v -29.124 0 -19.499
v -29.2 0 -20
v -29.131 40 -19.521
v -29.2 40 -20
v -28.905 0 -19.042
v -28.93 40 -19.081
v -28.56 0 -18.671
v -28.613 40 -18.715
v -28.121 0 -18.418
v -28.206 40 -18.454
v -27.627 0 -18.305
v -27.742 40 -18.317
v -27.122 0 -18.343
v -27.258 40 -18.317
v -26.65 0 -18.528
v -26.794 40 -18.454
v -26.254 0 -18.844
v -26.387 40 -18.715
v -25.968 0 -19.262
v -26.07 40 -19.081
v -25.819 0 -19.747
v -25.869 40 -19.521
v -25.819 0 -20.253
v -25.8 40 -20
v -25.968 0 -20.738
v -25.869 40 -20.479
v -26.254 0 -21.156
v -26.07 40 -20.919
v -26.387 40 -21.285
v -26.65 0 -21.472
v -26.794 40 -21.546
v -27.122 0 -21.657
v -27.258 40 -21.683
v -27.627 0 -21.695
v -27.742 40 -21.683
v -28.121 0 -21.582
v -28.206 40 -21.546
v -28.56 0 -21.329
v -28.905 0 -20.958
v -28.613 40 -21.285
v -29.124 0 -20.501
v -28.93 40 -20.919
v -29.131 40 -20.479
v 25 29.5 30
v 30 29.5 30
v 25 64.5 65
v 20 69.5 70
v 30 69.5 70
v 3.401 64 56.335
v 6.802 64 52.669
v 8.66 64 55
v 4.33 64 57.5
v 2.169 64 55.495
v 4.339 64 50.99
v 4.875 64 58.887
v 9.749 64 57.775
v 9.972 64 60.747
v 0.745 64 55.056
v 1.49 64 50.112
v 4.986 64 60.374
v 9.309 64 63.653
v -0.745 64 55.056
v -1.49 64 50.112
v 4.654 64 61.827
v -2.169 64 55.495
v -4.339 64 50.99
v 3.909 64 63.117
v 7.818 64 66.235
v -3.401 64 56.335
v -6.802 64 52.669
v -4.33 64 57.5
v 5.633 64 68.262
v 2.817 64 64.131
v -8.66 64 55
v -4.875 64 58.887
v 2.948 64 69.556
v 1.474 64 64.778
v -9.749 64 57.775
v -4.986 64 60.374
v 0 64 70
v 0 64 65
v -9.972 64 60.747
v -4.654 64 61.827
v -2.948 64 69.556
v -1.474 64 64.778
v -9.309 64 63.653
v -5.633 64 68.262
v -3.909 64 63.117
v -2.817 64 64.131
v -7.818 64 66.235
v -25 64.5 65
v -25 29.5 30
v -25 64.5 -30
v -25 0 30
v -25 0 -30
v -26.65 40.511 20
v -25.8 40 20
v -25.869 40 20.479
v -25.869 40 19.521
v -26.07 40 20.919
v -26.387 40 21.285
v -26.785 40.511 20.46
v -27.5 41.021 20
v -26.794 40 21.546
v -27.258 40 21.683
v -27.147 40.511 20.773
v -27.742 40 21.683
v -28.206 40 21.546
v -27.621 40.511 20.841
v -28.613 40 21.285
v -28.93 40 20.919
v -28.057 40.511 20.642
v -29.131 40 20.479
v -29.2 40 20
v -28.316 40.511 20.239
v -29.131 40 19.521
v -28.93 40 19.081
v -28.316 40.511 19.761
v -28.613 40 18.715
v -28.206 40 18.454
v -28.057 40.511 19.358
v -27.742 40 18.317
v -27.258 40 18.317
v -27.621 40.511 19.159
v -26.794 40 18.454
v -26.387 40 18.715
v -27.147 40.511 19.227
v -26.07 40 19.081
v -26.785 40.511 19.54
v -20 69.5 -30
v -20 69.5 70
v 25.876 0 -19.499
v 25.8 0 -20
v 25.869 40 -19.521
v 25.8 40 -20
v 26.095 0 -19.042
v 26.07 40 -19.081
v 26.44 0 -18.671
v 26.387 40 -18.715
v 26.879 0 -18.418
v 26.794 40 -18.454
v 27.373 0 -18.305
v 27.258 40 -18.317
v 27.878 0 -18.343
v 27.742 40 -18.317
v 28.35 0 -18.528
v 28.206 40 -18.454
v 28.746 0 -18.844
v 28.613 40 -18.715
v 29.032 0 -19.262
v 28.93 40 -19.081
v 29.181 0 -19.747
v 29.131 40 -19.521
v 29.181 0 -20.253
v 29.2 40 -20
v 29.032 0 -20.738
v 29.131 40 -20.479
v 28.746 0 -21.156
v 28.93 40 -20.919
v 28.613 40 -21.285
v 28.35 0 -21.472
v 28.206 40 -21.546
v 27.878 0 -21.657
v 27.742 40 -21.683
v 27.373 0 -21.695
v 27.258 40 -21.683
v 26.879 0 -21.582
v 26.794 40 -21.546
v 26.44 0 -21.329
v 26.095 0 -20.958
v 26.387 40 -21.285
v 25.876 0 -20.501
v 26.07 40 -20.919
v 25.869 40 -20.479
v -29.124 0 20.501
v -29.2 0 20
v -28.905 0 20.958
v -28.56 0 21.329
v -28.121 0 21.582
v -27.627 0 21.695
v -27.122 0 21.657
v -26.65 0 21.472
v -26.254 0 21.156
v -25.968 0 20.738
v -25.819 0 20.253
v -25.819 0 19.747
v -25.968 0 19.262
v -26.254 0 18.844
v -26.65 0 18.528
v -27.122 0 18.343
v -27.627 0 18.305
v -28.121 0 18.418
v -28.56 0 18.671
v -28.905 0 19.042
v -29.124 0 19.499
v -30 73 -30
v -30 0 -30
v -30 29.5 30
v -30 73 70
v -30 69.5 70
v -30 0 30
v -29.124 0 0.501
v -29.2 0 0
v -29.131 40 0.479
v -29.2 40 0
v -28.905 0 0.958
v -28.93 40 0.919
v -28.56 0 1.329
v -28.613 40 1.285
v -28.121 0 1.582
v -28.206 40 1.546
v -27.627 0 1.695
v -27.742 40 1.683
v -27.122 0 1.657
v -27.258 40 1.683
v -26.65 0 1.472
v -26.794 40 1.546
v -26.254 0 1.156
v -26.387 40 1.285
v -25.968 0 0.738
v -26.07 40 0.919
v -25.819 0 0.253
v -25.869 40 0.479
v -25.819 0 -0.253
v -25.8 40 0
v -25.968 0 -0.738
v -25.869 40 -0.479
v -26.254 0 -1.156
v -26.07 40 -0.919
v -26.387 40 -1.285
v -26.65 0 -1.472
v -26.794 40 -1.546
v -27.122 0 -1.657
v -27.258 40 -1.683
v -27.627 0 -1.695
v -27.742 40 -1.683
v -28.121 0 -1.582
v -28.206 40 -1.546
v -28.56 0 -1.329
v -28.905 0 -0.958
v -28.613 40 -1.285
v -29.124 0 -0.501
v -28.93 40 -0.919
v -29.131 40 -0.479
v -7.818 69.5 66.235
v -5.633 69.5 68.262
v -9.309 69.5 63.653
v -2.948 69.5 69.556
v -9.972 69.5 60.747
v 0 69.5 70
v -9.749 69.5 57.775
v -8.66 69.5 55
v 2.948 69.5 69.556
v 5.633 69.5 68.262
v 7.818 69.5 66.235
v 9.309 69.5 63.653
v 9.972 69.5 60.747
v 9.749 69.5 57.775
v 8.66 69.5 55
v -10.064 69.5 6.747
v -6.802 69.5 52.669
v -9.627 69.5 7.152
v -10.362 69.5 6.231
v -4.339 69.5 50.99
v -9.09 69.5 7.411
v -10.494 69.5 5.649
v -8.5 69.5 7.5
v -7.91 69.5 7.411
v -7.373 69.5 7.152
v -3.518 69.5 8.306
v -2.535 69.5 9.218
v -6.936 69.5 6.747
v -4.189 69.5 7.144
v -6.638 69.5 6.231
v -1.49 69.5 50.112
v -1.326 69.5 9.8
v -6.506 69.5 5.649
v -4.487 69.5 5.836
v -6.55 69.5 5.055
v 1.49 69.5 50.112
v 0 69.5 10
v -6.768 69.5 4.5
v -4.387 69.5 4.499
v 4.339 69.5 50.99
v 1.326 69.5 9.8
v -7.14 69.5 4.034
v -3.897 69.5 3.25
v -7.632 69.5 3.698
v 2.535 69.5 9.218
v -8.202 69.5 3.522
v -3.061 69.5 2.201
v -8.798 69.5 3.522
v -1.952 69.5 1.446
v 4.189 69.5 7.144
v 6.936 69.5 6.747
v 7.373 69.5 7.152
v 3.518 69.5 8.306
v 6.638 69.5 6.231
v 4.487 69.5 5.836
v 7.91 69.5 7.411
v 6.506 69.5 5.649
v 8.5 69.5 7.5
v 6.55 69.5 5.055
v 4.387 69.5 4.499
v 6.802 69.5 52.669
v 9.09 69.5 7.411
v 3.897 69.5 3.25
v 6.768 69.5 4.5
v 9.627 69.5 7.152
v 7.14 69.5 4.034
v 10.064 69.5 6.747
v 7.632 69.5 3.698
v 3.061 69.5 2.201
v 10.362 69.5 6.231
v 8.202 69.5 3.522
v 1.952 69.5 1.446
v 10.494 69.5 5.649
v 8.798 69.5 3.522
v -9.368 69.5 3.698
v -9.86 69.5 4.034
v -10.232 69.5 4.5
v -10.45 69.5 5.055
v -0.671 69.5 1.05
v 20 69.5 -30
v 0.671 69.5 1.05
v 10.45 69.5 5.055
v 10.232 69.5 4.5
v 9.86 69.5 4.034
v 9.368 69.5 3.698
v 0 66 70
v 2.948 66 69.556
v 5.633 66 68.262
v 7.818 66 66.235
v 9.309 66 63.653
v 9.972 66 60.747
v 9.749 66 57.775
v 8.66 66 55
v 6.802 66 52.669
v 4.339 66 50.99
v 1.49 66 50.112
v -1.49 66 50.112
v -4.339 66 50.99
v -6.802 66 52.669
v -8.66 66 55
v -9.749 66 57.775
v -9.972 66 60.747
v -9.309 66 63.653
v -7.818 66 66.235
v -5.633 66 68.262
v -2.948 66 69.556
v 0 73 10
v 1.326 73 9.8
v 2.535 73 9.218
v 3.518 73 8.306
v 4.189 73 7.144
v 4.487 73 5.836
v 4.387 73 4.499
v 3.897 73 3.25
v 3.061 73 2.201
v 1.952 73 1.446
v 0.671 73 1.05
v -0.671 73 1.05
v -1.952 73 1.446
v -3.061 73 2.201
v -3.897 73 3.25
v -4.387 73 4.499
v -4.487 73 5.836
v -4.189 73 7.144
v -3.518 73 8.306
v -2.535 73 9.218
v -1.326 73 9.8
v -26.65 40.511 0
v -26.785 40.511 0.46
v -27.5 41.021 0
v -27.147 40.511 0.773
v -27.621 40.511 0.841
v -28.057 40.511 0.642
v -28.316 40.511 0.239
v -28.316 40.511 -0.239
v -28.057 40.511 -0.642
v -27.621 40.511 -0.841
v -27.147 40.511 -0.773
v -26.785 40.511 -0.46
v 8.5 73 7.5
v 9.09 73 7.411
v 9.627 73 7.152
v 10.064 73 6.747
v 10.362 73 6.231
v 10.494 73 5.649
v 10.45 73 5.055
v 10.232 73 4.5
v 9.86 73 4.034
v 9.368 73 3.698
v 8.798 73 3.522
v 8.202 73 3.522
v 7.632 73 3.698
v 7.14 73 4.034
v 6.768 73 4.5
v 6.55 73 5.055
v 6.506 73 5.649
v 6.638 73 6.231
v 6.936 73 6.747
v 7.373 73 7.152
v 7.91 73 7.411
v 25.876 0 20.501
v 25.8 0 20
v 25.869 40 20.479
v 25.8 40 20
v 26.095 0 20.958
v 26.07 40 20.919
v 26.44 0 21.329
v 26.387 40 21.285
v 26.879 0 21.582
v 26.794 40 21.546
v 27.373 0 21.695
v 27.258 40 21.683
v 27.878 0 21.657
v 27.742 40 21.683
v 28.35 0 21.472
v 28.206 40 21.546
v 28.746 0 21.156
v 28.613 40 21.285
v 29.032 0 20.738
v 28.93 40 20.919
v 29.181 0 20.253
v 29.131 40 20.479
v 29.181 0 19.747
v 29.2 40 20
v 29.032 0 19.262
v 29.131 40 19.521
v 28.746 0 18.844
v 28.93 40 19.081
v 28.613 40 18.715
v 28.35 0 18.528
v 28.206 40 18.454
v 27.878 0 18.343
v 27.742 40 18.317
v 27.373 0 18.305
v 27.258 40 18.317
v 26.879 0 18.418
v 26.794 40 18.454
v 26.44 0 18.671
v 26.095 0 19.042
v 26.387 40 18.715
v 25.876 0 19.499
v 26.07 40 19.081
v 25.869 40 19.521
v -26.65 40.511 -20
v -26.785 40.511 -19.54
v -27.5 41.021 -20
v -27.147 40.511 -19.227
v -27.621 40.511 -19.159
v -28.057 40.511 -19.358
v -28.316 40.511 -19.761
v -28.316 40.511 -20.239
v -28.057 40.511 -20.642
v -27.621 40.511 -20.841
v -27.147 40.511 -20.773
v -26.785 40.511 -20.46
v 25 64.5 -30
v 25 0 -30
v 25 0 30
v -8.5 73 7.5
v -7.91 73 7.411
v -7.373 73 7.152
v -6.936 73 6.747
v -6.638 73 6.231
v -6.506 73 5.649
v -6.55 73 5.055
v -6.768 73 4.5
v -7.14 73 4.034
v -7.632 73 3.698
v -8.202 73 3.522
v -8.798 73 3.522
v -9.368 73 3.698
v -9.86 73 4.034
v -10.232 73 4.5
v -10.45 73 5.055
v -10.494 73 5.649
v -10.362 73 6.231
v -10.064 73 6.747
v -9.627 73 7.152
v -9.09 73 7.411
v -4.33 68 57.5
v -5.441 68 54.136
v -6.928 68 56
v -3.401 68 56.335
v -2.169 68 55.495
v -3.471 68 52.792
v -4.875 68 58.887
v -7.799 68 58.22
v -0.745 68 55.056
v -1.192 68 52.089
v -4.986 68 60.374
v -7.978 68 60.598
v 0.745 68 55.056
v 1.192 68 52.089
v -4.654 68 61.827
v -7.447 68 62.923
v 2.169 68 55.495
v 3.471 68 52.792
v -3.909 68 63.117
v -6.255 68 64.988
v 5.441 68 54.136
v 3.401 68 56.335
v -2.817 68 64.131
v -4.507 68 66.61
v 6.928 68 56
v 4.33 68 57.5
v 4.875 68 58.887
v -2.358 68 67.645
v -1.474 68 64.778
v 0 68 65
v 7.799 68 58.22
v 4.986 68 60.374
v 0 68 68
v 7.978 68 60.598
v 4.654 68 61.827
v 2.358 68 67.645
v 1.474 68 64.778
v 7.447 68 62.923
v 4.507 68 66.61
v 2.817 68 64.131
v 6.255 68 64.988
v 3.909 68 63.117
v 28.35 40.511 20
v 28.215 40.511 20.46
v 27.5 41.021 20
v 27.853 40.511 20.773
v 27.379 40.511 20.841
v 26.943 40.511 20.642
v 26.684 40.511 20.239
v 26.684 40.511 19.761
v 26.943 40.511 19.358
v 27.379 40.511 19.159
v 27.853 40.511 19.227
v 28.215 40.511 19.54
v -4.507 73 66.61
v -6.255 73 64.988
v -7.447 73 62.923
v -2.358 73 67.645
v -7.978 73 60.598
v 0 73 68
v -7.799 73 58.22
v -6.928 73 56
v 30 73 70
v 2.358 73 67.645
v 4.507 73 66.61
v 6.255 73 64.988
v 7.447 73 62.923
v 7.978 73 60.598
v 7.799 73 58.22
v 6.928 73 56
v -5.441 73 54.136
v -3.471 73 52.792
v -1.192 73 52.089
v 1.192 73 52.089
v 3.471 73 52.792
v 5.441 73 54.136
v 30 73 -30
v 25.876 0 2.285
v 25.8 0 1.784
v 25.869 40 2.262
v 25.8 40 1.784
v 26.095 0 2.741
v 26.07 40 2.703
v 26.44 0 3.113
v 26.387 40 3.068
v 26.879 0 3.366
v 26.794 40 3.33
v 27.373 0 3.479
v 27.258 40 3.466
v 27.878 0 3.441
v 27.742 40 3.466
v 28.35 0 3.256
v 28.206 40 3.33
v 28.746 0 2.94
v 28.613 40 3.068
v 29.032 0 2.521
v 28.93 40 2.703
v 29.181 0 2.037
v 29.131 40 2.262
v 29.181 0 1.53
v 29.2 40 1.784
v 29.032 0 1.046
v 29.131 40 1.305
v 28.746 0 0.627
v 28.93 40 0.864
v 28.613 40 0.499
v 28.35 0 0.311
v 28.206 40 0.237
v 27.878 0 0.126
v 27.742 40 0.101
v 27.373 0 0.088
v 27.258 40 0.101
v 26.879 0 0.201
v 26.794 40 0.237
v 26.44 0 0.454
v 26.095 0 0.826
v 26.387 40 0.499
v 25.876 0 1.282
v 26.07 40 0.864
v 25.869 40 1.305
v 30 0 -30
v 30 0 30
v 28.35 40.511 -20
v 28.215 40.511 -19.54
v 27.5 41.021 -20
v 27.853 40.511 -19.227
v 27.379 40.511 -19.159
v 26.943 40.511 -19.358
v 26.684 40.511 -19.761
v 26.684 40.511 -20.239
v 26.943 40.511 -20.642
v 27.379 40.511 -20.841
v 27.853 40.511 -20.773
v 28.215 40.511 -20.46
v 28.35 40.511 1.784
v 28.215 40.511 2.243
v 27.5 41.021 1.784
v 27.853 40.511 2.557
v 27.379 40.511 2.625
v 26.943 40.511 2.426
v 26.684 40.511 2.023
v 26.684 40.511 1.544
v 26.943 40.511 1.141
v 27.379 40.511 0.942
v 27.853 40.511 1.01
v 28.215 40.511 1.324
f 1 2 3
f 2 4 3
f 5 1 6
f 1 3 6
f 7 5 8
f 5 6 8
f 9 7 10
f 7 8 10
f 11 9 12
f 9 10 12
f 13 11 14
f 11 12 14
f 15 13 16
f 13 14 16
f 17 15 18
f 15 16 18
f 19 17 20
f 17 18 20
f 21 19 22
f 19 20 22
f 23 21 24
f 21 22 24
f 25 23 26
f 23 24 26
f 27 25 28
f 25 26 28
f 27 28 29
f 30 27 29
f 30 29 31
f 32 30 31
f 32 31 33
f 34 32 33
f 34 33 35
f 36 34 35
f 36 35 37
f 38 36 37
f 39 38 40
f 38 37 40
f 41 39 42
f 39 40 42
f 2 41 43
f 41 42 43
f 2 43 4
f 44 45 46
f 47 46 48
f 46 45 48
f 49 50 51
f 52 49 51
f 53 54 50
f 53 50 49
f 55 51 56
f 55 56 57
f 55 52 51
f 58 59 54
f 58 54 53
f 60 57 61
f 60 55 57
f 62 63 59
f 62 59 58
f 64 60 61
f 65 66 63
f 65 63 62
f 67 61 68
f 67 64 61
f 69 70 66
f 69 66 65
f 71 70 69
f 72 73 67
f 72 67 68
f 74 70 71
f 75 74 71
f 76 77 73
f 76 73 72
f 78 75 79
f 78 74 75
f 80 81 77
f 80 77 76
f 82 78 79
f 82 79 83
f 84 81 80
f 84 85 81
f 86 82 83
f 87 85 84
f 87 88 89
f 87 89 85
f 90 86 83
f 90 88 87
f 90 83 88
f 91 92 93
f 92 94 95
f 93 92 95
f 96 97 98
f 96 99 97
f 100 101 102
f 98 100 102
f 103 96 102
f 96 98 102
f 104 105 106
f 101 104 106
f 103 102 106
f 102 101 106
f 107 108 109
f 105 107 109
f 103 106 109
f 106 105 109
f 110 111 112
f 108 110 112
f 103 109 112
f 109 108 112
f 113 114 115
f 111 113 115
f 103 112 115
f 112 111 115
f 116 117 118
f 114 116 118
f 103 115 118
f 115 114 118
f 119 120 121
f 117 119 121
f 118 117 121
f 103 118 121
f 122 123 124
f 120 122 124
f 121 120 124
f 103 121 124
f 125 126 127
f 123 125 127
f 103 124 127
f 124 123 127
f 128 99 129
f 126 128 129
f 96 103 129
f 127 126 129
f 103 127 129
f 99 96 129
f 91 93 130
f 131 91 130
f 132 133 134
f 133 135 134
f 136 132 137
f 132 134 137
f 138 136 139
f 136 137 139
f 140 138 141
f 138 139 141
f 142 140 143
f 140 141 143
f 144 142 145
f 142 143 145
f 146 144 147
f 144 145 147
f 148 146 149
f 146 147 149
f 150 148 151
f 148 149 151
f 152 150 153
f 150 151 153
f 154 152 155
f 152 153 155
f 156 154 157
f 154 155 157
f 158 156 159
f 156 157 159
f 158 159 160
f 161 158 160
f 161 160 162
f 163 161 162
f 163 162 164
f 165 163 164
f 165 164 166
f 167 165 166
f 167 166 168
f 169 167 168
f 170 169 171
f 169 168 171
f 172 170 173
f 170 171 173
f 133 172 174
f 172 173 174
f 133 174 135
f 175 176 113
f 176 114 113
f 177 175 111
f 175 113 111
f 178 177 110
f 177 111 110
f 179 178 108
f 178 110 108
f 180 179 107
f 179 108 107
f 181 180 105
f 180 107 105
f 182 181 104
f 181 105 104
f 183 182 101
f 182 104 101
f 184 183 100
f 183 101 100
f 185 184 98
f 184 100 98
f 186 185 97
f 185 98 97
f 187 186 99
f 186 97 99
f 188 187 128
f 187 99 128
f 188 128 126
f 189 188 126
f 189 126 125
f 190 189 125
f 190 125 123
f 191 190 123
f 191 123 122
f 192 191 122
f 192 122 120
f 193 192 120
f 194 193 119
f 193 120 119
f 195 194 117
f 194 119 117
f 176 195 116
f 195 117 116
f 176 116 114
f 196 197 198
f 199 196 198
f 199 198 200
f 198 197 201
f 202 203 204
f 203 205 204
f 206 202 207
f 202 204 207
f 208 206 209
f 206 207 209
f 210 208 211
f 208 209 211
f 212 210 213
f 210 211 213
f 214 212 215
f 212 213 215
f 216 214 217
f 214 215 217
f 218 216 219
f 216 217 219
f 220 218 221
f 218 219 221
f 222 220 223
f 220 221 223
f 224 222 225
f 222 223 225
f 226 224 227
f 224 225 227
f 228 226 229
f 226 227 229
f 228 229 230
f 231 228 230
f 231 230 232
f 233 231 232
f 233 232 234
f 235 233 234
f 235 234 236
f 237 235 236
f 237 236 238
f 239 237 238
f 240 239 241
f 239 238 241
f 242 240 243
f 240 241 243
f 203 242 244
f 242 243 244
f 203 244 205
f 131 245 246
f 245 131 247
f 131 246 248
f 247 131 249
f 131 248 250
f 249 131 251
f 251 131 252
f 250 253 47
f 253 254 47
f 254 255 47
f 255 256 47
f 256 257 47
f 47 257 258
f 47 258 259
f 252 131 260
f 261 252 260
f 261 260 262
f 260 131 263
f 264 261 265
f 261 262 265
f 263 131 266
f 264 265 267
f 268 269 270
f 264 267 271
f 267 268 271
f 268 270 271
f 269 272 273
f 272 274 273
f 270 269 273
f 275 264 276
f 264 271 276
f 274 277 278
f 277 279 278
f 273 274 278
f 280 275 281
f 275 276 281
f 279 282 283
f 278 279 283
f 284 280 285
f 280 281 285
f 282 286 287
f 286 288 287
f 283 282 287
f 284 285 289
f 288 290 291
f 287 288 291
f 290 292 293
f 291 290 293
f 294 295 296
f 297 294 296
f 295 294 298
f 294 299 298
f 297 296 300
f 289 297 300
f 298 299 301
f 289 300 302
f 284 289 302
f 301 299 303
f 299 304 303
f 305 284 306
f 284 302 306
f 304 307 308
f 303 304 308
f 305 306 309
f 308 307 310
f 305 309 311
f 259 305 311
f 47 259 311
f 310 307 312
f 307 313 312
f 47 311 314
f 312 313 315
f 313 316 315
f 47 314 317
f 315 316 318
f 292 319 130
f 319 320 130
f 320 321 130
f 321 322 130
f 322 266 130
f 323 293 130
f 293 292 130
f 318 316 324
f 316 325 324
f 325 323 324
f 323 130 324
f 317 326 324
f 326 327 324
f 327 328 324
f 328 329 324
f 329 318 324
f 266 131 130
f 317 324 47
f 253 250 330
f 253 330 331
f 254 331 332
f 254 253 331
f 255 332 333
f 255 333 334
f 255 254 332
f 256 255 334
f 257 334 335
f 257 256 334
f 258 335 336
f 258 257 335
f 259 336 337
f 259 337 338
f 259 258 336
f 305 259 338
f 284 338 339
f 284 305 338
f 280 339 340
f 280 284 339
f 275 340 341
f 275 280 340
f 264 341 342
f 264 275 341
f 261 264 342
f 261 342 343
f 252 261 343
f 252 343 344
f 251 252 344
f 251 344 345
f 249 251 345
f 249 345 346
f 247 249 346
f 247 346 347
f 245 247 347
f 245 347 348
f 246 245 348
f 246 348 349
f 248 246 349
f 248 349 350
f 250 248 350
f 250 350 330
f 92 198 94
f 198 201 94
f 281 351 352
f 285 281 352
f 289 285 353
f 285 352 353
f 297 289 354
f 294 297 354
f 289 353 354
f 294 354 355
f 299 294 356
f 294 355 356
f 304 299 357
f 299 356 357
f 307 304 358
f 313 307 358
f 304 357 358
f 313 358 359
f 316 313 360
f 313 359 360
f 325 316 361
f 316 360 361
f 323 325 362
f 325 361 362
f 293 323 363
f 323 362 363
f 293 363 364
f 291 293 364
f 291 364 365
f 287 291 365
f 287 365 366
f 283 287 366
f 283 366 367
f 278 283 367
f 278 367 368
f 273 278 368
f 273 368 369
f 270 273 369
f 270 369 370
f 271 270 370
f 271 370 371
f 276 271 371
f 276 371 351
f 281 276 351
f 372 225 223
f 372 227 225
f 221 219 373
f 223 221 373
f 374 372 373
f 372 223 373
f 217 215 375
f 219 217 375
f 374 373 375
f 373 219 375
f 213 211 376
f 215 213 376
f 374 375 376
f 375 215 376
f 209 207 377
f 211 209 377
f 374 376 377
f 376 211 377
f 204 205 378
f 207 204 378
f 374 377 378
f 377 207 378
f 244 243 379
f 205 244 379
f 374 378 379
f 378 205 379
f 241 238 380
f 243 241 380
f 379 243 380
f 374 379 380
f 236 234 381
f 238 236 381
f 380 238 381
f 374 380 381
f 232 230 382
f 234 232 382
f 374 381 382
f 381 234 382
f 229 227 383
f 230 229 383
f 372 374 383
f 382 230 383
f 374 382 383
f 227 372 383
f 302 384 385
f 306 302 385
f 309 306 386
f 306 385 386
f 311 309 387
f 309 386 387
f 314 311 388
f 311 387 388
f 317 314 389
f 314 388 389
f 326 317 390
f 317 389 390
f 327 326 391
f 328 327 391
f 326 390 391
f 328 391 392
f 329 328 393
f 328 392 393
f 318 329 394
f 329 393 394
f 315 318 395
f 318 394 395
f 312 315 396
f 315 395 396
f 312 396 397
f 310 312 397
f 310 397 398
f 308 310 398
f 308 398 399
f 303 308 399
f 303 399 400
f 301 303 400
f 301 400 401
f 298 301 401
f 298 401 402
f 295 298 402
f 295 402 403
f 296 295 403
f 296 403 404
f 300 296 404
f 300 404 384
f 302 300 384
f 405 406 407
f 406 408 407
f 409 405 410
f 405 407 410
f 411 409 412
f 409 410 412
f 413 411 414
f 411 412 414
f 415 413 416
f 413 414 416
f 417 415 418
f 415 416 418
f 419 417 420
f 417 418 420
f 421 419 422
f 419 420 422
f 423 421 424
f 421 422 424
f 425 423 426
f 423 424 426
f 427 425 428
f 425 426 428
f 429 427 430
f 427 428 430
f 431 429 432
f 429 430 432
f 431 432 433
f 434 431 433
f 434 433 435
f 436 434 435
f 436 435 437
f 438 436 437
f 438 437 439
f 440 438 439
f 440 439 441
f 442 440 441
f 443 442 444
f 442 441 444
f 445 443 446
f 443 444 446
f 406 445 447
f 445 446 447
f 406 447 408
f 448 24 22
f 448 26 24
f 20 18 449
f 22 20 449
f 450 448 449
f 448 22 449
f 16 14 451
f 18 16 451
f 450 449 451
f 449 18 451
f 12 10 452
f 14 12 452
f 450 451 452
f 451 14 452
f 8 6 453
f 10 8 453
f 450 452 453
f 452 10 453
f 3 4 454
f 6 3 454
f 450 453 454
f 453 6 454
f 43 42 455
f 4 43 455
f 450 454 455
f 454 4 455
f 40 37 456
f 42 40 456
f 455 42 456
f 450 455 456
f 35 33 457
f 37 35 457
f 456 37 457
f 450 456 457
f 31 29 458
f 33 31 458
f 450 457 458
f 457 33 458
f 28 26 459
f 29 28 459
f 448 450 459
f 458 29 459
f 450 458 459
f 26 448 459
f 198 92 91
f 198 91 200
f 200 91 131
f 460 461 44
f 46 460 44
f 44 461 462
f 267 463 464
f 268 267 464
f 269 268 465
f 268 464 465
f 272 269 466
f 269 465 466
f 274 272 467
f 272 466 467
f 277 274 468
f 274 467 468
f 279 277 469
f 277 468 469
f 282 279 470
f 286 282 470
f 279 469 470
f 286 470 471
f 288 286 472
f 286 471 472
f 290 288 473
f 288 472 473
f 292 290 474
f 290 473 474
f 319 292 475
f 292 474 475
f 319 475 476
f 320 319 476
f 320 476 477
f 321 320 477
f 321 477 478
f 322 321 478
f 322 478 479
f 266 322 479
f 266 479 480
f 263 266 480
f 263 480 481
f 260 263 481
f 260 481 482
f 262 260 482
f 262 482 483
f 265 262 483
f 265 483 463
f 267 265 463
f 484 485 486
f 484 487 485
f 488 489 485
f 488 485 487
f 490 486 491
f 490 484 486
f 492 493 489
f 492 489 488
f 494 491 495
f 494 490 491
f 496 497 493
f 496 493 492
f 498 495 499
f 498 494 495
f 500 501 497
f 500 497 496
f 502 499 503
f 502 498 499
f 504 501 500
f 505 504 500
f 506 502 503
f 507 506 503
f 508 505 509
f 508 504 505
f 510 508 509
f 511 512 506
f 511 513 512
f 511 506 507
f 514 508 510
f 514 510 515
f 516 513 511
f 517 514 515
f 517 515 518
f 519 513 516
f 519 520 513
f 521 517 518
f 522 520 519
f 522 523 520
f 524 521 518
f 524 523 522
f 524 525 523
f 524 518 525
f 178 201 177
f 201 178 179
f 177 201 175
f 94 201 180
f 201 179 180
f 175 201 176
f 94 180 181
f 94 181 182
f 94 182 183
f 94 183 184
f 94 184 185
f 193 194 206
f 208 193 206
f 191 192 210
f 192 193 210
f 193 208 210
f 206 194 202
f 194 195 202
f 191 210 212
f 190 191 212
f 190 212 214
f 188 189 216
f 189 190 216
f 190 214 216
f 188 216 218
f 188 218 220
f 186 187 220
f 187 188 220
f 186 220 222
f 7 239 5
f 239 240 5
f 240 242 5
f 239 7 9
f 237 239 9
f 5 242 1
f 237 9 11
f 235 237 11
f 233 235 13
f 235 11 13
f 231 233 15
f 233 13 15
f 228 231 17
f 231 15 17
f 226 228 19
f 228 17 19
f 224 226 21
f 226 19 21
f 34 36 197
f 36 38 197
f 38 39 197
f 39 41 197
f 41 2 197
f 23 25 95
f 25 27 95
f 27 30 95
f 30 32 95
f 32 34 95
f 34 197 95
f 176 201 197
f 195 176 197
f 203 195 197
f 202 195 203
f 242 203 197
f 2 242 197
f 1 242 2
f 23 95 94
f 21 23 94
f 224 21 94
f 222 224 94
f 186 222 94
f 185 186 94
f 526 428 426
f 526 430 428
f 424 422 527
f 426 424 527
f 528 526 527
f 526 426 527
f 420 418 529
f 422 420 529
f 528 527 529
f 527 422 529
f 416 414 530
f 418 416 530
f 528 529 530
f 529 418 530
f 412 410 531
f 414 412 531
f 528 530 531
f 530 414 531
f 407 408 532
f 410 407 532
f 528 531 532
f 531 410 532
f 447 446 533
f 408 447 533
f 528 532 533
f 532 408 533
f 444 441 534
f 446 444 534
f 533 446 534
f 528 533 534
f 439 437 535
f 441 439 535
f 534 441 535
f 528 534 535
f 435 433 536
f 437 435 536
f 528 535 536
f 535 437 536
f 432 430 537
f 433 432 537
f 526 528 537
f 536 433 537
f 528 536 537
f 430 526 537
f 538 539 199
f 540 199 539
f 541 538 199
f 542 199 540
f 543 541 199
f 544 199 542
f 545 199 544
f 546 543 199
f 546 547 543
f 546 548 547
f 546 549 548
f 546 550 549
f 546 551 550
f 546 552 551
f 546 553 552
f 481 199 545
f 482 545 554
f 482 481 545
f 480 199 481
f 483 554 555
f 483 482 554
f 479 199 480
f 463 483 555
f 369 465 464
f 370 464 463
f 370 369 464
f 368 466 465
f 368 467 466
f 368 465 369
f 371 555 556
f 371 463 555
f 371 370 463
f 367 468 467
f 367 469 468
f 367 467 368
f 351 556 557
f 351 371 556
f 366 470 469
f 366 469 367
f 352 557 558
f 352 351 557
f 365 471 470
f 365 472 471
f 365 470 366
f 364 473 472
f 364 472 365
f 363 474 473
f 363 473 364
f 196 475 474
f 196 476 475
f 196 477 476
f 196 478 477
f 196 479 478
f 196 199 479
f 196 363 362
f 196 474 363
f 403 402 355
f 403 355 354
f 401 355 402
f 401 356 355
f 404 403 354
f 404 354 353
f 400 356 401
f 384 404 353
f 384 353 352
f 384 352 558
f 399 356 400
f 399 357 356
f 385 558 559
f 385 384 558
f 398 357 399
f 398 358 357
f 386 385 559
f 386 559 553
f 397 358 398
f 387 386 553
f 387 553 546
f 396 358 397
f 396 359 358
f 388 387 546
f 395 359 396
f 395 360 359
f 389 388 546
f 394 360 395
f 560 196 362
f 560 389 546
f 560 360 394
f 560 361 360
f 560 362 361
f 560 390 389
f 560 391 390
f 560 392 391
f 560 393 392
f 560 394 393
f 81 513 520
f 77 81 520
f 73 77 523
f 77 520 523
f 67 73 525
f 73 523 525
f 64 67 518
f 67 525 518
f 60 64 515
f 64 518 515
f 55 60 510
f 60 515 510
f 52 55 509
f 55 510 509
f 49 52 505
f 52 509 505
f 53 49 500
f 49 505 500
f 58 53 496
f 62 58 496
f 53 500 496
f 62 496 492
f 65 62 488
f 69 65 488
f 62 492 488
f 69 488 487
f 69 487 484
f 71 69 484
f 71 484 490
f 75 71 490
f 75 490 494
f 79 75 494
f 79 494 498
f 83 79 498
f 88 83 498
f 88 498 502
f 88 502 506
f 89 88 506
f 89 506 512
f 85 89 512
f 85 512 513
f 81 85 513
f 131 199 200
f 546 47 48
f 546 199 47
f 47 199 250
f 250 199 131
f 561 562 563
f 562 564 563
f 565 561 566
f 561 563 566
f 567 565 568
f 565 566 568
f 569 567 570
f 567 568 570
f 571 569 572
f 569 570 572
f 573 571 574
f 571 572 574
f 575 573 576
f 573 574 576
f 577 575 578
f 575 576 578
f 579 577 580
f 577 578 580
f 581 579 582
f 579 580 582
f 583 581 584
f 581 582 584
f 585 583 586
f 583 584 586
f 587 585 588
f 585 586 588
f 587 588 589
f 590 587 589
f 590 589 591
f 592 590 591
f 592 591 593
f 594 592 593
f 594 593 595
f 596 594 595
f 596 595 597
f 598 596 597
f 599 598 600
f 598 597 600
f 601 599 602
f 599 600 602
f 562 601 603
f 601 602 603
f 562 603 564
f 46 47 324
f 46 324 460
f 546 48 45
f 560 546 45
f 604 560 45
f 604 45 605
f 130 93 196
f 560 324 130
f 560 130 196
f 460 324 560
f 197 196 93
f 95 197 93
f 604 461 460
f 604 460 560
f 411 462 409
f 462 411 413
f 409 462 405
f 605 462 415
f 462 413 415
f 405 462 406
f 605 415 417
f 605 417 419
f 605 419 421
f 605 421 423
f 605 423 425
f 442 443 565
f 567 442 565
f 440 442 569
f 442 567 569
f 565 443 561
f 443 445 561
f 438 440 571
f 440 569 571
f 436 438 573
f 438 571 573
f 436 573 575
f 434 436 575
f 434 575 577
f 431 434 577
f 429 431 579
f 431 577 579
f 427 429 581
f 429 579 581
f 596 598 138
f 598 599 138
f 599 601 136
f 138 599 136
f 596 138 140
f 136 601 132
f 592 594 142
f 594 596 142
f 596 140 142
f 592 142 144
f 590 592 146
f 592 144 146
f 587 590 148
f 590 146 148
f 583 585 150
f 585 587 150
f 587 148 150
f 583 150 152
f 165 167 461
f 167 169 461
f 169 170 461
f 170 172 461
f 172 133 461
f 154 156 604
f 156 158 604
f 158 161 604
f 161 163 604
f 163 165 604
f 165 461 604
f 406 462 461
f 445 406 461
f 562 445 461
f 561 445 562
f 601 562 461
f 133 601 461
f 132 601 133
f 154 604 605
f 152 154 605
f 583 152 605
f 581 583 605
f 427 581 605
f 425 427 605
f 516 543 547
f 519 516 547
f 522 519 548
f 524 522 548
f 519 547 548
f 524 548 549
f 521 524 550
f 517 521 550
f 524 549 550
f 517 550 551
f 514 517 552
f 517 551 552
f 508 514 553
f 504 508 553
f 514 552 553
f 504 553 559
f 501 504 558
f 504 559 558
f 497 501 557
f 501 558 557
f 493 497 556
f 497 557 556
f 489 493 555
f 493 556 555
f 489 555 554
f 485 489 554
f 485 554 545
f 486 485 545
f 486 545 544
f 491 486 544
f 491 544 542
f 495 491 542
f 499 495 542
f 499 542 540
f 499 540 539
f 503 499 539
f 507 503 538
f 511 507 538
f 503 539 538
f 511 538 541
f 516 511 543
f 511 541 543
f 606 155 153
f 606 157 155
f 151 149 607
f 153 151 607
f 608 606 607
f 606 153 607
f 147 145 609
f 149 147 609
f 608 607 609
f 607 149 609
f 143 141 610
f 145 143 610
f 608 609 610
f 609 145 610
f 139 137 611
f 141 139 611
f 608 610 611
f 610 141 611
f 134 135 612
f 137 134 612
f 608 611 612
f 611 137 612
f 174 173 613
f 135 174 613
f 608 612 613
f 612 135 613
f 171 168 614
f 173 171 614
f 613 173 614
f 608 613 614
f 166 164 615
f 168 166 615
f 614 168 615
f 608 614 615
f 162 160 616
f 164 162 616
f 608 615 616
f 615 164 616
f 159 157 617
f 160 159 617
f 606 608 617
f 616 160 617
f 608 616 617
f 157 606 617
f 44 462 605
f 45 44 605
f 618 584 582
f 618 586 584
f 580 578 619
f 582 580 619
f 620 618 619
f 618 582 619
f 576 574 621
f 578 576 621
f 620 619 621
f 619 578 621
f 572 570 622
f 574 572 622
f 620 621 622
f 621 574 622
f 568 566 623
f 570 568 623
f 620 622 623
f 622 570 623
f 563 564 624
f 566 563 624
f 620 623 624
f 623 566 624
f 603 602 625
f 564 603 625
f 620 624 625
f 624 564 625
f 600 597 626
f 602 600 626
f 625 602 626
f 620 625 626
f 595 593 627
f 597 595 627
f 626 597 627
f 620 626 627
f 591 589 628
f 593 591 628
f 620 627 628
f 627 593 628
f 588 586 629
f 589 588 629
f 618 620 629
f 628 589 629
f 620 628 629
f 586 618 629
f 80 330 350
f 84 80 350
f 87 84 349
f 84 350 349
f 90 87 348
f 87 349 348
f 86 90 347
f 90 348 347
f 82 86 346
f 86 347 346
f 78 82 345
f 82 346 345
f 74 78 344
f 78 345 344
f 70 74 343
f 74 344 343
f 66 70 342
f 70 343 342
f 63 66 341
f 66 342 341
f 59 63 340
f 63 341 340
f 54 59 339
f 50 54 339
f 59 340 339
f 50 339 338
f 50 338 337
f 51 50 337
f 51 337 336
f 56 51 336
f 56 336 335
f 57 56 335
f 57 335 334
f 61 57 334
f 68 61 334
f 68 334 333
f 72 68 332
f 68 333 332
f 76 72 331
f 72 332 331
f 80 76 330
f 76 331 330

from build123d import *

# Parameters (mm, degrees)
CROQUIS1_W                       = 60
CROQUIS1_H                       = 60
SALIENTE_EXTRUIR1_DEPTH          = 73
CORTAR_EXTRUIR1_REACH            = 101.141
CROQUIS2_W                       = 50
CROQUIS2_H                       = 69.5
CORTAR_EXTRUIR2_REACH            = 86.433
CROQUIS3_R                       = 2
CHAFL_N1_SIZE                    = 5
TALADRO_DE_MARGEN_PARA_M31_D     = 3.4
TALADRO_DE_MARGEN_PARA_M31_DEPTH = 40
TALADRO_DE_MARGEN_PARA_M31_TIP   = 1.021463052
TALADRO_DE_MARGEN_PARA_M32_D     = 3.4
TALADRO_DE_MARGEN_PARA_M32_DEPTH = 40
TALADRO_DE_MARGEN_PARA_M32_TIP   = 1.021463052
TALADRO_DE_MARGEN_PARA_M33_D     = 3.4
TALADRO_DE_MARGEN_PARA_M33_DEPTH = 40
TALADRO_DE_MARGEN_PARA_M33_TIP   = 1.021463052
CROQUIS11_W                      = 60
CROQUIS11_H                      = 3.5
SALIENTE_EXTRUIR2_DEPTH          = 40
CHAFL_N2_SIZE                    = 40
CORTAR_EXTRUIR3_REACH            = 107.494
CROQUIS12_R                      = 2.5
CROQUIS14_R                      = 10
SALIENTE_EXTRUIR3_DEPTH          = 7
CROQUIS15_R                      = 10
SALIENTE_EXTRUIR4_DEPTH          = 2
CROQUIS13_R                      = 8
CORTAR_EXTRUIR5_DEPTH            = 5
CROQUIS16_R                      = 5
CORTAR_EXTRUIR6_DEPTH            = 5
CROQUIS17_R                      = 4.5
CORTAR_EXTRUIR7_DEPTH            = 16


with BuildPart() as part:
    # Croquis1 → Saliente-Extruir1 (new body)
    with BuildSketch(Plane(origin=(0, 0, 0), x_dir=(1, 0, 0), z_dir=(0, 1, 0))):
        Rectangle(CROQUIS1_W, CROQUIS1_H)
    extrude(amount=SALIENTE_EXTRUIR1_DEPTH)

    # Croquis2 → Cortar-Extruir1 (cut, up to next)
    with BuildSketch(Plane.XY.offset(30), mode=Mode.PRIVATE) as cortar_extruir1_sk1:
        with Locations((0, 34.75)):
            Rectangle(CROQUIS2_W, CROQUIS2_H)
    cortar_extruir1_tool1 = extrude(cortar_extruir1_sk1.sketch, amount=-CORTAR_EXTRUIR1_REACH, mode=Mode.PRIVATE) & part.part
    add(cortar_extruir1_tool1.solids().sort_by_distance((0, 34.75, 30))[0], mode=Mode.SUBTRACT)

    # Croquis3 → Cortar-Extruir2 (cut, up to next)
    with BuildSketch(Plane(origin=(0, 73, 0), x_dir=(1, 0, 0), z_dir=(0, 1, 0)), mode=Mode.PRIVATE) as cortar_extruir2_sk1:
        with Locations(Location((-8.5, -5.5, 0), (0, 0, 270))):
            Circle(CROQUIS3_R)
    cortar_extruir2_tool1 = extrude(cortar_extruir2_sk1.sketch, amount=-CORTAR_EXTRUIR2_REACH, mode=Mode.PRIVATE) & part.part
    # Croquis3 → Cortar-Extruir2 (cut, up to next)
    with BuildSketch(Plane(origin=(0, 73, 0), x_dir=(1, 0, 0), z_dir=(0, 1, 0)), mode=Mode.PRIVATE) as cortar_extruir2_sk2:
        with Locations(Location((8.5, -5.5, 0), (0, 0, 270))):
            Circle(CROQUIS3_R)
    cortar_extruir2_tool2 = extrude(cortar_extruir2_sk2.sketch, amount=-CORTAR_EXTRUIR2_REACH, mode=Mode.PRIVATE) & part.part
    add(cortar_extruir2_tool1.solids().sort_by_distance((-8.5, 73, 5.5))[0], mode=Mode.SUBTRACT)
    add(cortar_extruir2_tool2.solids().sort_by_distance((8.5, 73, 5.5))[0], mode=Mode.SUBTRACT)

    # Chaflán1
    chafl_n1_edges = [part.edges().sort_by_distance(p)[0] for p in [
        (-25, 69.5, 0),
        (25, 69.5, 0),
    ]]
    chamfer(chafl_n1_edges, length=CHAFL_N1_SIZE)

    # Taladro de margen para M31
    with Locations(Plane.XZ):
        with Locations((27.5, -20), (27.5, 20)):
            Hole(TALADRO_DE_MARGEN_PARA_M31_D / 2, depth=TALADRO_DE_MARGEN_PARA_M31_DEPTH)
            with Locations((0, 0, -(TALADRO_DE_MARGEN_PARA_M31_DEPTH + TALADRO_DE_MARGEN_PARA_M31_TIP / 2))):  # 118° drill point
                Cone(0, TALADRO_DE_MARGEN_PARA_M31_D / 2, TALADRO_DE_MARGEN_PARA_M31_TIP, mode=Mode.SUBTRACT)

    # Taladro de margen para M32
    with Locations(Plane.XZ):
        with Locations((-27.5, 20), (-27.5, -20)):
            Hole(TALADRO_DE_MARGEN_PARA_M32_D / 2, depth=TALADRO_DE_MARGEN_PARA_M32_DEPTH)
            with Locations((0, 0, -(TALADRO_DE_MARGEN_PARA_M32_DEPTH + TALADRO_DE_MARGEN_PARA_M32_TIP / 2))):  # 118° drill point
                Cone(0, TALADRO_DE_MARGEN_PARA_M32_D / 2, TALADRO_DE_MARGEN_PARA_M32_TIP, mode=Mode.SUBTRACT)

    # Taladro de margen para M33
    with Locations(Plane.XZ):
        with Locations((-27.5, 0), (27.5, 1.783505525)):
            Hole(TALADRO_DE_MARGEN_PARA_M33_D / 2, depth=TALADRO_DE_MARGEN_PARA_M33_DEPTH)
            with Locations((0, 0, -(TALADRO_DE_MARGEN_PARA_M33_DEPTH + TALADRO_DE_MARGEN_PARA_M33_TIP / 2))):  # 118° drill point
                Cone(0, TALADRO_DE_MARGEN_PARA_M33_D / 2, TALADRO_DE_MARGEN_PARA_M33_TIP, mode=Mode.SUBTRACT)

    # Croquis11 → Saliente-Extruir2 (add)
    with BuildSketch(Plane.XY.offset(30)):
        with Locations((0, 71.25)):
            Rectangle(CROQUIS11_W, CROQUIS11_H)
    extrude(amount=SALIENTE_EXTRUIR2_DEPTH)

    # Chaflán2
    # the kernel refuses this chamfer: 40 mm, written as the material it adds along each edge
    with BuildSketch(Plane(origin=(30, 69.5, 30), x_dir=(0, -0.9996219169112968, -0.027495876610586403), z_dir=(-1, 0, 0))) as chafl_n2_piece_1_section:
        Polygon((CHAFL_N2_SIZE * 0.999621916911, CHAFL_N2_SIZE * 0.0274958766106), (-CHAFL_N2_SIZE * 0.0274958766106, CHAFL_N2_SIZE * 0.999621916911), (0, 0), align=None)
    chafl_n2_piece_1 = extrude(amount=112.867319519, mode=Mode.PRIVATE)
    chafl_n2_piece_1 = split(chafl_n2_piece_1, bisect_by=Plane(origin=(25, 65.769230769, 48.134615385), z_dir=(1, 0, 0)), keep=Keep.TOP, mode=Mode.PRIVATE)
    add(chafl_n2_piece_1)
    with BuildSketch(Plane(origin=(132.867319519, 69.5, 30), x_dir=(0, -0.9996219169112968, -0.027495876610586403), z_dir=(-1, 0, 0))) as chafl_n2_piece_2_section:
        Polygon((CHAFL_N2_SIZE * 0.999621916911, CHAFL_N2_SIZE * 0.0274958766106), (-CHAFL_N2_SIZE * 0.0274958766106, CHAFL_N2_SIZE * 0.999621916911), (0, 0), align=None)
    chafl_n2_piece_2 = extrude(amount=215.734639037, mode=Mode.PRIVATE)
    chafl_n2_piece_2 = split(chafl_n2_piece_2, bisect_by=Plane(origin=(22.472826087, 67.027173913, 49.184782609), z_dir=(0.7071067811865476, 0.7071067811865476, 0)), keep=Keep.TOP, mode=Mode.PRIVATE)
    chafl_n2_piece_2 = split(chafl_n2_piece_2, bisect_by=Plane(origin=(25, 67.869565217, 49.184782609), z_dir=(-1, 0, 0)), keep=Keep.TOP, mode=Mode.PRIVATE)
    add(chafl_n2_piece_2)
    with BuildSketch(Plane(origin=(132.867319519, 69.5, 30), x_dir=(0, -0.9996219169112968, -0.027495876610586403), z_dir=(-1, 0, 0))) as chafl_n2_piece_3_section:
        Polygon((CHAFL_N2_SIZE * 0.999621916911, CHAFL_N2_SIZE * 0.0274958766106), (-CHAFL_N2_SIZE * 0.0274958766106, CHAFL_N2_SIZE * 0.999621916911), (0, 0), align=None)
    chafl_n2_piece_3 = extrude(amount=215.734639037, mode=Mode.PRIVATE)
    chafl_n2_piece_3 = split(chafl_n2_piece_3, bisect_by=Plane(origin=(-30, 67.869565217, 49.184782609), z_dir=(1, 0, 0)), keep=Keep.TOP, mode=Mode.PRIVATE)
    chafl_n2_piece_3 = split(chafl_n2_piece_3, bisect_by=Plane(origin=(-22.472826087, 67.027173913, 49.184782609), z_dir=(-0.7071067811865476, 0.7071067811865476, 0)), keep=Keep.TOP, mode=Mode.PRIVATE)
    add(chafl_n2_piece_3)
    with BuildSketch(Plane(origin=(132.867319519, 69.5, 30), x_dir=(0, -0.9996219169112968, -0.027495876610586403), z_dir=(-1, 0, 0))) as chafl_n2_piece_4_section:
        Polygon((CHAFL_N2_SIZE * 0.999621916911, CHAFL_N2_SIZE * 0.0274958766106), (-CHAFL_N2_SIZE * 0.0274958766106, CHAFL_N2_SIZE * 0.999621916911), (0, 0), align=None)
    chafl_n2_piece_4 = extrude(amount=215.734639037, mode=Mode.PRIVATE)
    chafl_n2_piece_4 = split(chafl_n2_piece_4, bisect_by=Plane(origin=(-25, 51.251968504, 40.875984252), z_dir=(-1, 0, 0)), keep=Keep.TOP, mode=Mode.PRIVATE)
    chafl_n2_piece_4 = split(chafl_n2_piece_4, bisect_by=Plane(origin=(-30, 51.251968504, 40.875984252), z_dir=(1, 0, 0)), keep=Keep.TOP, mode=Mode.PRIVATE)
    add(chafl_n2_piece_4)
    with BuildSketch(Plane(origin=(82.867319519, 69.5, 30), x_dir=(0, -0.9996219169112968, -0.027495876610586403), z_dir=(-1, 0, 0))) as chafl_n2_piece_5_section:
        Polygon((CHAFL_N2_SIZE * 0.999621916911, CHAFL_N2_SIZE * 0.0274958766106), (-CHAFL_N2_SIZE * 0.0274958766106, CHAFL_N2_SIZE * 0.999621916911), (0, 0), align=None)
    chafl_n2_piece_5 = extrude(amount=215.734639037, mode=Mode.PRIVATE)
    chafl_n2_piece_5 = split(chafl_n2_piece_5, bisect_by=Plane(origin=(30, 65.769230769, 48.134615385), z_dir=(-1, 0, 0)), keep=Keep.TOP, mode=Mode.PRIVATE)
    chafl_n2_piece_5 = split(chafl_n2_piece_5, bisect_by=Plane(origin=(25, 65.769230769, 48.134615385), z_dir=(1, 0, 0)), keep=Keep.TOP, mode=Mode.PRIVATE)
    add(chafl_n2_piece_5)
    with BuildSketch(Plane(origin=(82.867319519, 69.5, 30), x_dir=(0, -0.9996219169112968, -0.027495876610586403), z_dir=(-1, 0, 0))) as chafl_n2_piece_6_section:
        Polygon((CHAFL_N2_SIZE * 0.999621916911, CHAFL_N2_SIZE * 0.0274958766106), (-CHAFL_N2_SIZE * 0.0274958766106, CHAFL_N2_SIZE * 0.999621916911), (0, 0), align=None)
    chafl_n2_piece_6 = extrude(amount=215.734639037, mode=Mode.PRIVATE)
    chafl_n2_piece_6 = split(chafl_n2_piece_6, bisect_by=Plane(origin=(22.472826087, 67.027173913, 49.184782609), z_dir=(0.7071067811865476, 0.7071067811865476, 0)), keep=Keep.TOP, mode=Mode.PRIVATE)
    chafl_n2_piece_6 = split(chafl_n2_piece_6, bisect_by=Plane(origin=(25, 67.869565217, 49.184782609), z_dir=(-1, 0, 0)), keep=Keep.TOP, mode=Mode.PRIVATE)
    add(chafl_n2_piece_6)
    with BuildSketch(Plane(origin=(82.867319519, 69.5, 30), x_dir=(0, -0.9996219169112968, -0.027495876610586403), z_dir=(-1, 0, 0))) as chafl_n2_piece_7_section:
        Polygon((CHAFL_N2_SIZE * 0.999621916911, CHAFL_N2_SIZE * 0.0274958766106), (-CHAFL_N2_SIZE * 0.0274958766106, CHAFL_N2_SIZE * 0.999621916911), (0, 0), align=None)
    chafl_n2_piece_7 = extrude(amount=112.867319519, mode=Mode.PRIVATE)
    chafl_n2_piece_7 = split(chafl_n2_piece_7, bisect_by=Plane(origin=(-22.472826087, 67.027173913, 49.184782609), z_dir=(-0.7071067811865476, 0.7071067811865476, 0)), keep=Keep.TOP, mode=Mode.PRIVATE)
    add(chafl_n2_piece_7)
    with BuildSketch(Plane(origin=(82.867319519, 69.5, 30), x_dir=(0, -0.9996219169112968, -0.027495876610586403), z_dir=(-1, 0, 0))) as chafl_n2_piece_8_section:
        Polygon((CHAFL_N2_SIZE * 0.999621916911, CHAFL_N2_SIZE * 0.0274958766106), (-CHAFL_N2_SIZE * 0.0274958766106, CHAFL_N2_SIZE * 0.999621916911), (0, 0), align=None)
    chafl_n2_piece_8 = extrude(amount=112.867319519, mode=Mode.PRIVATE)
    chafl_n2_piece_8 = split(chafl_n2_piece_8, bisect_by=Plane(origin=(-25, 51.251968504, 40.875984252), z_dir=(-1, 0, 0)), keep=Keep.TOP, mode=Mode.PRIVATE)
    add(chafl_n2_piece_8)

    # Croquis12 → Cortar-Extruir3 (cut, up to next)
    with BuildSketch(Plane(origin=(0, 73, 0), x_dir=(1, 0, 0), z_dir=(0, 1, 0)), mode=Mode.PRIVATE) as cortar_extruir3_sk1:
        with Locations(Location((0, -60, 0), (0, 0, 270))):
            Circle(CROQUIS12_R)
    cortar_extruir3_tool1 = extrude(cortar_extruir3_sk1.sketch, amount=-CORTAR_EXTRUIR3_REACH, mode=Mode.PRIVATE) & part.part
    add(cortar_extruir3_tool1.solids().sort_by_distance((0, 73, 60))[0], mode=Mode.SUBTRACT)

    # Croquis14 → Saliente-Extruir3 (add)
    with BuildSketch(Plane(origin=(0, 73, 0), x_dir=(1, 0, 0), z_dir=(0, 1, 0))):
        with Locations(Location((0, -60, 0), (0, 0, 270))):
            Circle(CROQUIS14_R)
    extrude(amount=-SALIENTE_EXTRUIR3_DEPTH)

    # Croquis15 → Saliente-Extruir4 (add)
    with BuildSketch(Plane.XZ.offset(-66)):
        with Locations(Location((0, 60, 0), (0, 0, 90))):
            Circle(CROQUIS15_R)
    extrude(amount=SALIENTE_EXTRUIR4_DEPTH)

    # Croquis13 → Cortar-Extruir5 (cut)
    with BuildSketch(Plane(origin=(0, 73, 0), x_dir=(1, 0, 0), z_dir=(0, 1, 0))):
        with Locations(Location((0, -60, 0), (0, 0, 270))):
            Circle(CROQUIS13_R)
    extrude(amount=-CORTAR_EXTRUIR5_DEPTH, mode=Mode.SUBTRACT)

    # Croquis16 → Cortar-Extruir6 (cut)
    with BuildSketch(Plane(origin=(0, 68, 0), x_dir=(1, 0, 0), z_dir=(0, 1, 0))):
        with Locations(Location((0, -60, 0), (0, 0, 270))):
            Circle(CROQUIS16_R)
    extrude(amount=-CORTAR_EXTRUIR6_DEPTH, mode=Mode.SUBTRACT)

    # Croquis17 → Cortar-Extruir7 (cut)
    with BuildSketch(Plane(origin=(0, 73, 0), x_dir=(1, 0, 0), z_dir=(0, 1, 0))):
        with Locations(Location((0, -5.5, 0), (0, 0, 270))):
            Circle(CROQUIS17_R)
    extrude(amount=-CORTAR_EXTRUIR7_DEPTH, mode=Mode.SUBTRACT)


solid = part.part
